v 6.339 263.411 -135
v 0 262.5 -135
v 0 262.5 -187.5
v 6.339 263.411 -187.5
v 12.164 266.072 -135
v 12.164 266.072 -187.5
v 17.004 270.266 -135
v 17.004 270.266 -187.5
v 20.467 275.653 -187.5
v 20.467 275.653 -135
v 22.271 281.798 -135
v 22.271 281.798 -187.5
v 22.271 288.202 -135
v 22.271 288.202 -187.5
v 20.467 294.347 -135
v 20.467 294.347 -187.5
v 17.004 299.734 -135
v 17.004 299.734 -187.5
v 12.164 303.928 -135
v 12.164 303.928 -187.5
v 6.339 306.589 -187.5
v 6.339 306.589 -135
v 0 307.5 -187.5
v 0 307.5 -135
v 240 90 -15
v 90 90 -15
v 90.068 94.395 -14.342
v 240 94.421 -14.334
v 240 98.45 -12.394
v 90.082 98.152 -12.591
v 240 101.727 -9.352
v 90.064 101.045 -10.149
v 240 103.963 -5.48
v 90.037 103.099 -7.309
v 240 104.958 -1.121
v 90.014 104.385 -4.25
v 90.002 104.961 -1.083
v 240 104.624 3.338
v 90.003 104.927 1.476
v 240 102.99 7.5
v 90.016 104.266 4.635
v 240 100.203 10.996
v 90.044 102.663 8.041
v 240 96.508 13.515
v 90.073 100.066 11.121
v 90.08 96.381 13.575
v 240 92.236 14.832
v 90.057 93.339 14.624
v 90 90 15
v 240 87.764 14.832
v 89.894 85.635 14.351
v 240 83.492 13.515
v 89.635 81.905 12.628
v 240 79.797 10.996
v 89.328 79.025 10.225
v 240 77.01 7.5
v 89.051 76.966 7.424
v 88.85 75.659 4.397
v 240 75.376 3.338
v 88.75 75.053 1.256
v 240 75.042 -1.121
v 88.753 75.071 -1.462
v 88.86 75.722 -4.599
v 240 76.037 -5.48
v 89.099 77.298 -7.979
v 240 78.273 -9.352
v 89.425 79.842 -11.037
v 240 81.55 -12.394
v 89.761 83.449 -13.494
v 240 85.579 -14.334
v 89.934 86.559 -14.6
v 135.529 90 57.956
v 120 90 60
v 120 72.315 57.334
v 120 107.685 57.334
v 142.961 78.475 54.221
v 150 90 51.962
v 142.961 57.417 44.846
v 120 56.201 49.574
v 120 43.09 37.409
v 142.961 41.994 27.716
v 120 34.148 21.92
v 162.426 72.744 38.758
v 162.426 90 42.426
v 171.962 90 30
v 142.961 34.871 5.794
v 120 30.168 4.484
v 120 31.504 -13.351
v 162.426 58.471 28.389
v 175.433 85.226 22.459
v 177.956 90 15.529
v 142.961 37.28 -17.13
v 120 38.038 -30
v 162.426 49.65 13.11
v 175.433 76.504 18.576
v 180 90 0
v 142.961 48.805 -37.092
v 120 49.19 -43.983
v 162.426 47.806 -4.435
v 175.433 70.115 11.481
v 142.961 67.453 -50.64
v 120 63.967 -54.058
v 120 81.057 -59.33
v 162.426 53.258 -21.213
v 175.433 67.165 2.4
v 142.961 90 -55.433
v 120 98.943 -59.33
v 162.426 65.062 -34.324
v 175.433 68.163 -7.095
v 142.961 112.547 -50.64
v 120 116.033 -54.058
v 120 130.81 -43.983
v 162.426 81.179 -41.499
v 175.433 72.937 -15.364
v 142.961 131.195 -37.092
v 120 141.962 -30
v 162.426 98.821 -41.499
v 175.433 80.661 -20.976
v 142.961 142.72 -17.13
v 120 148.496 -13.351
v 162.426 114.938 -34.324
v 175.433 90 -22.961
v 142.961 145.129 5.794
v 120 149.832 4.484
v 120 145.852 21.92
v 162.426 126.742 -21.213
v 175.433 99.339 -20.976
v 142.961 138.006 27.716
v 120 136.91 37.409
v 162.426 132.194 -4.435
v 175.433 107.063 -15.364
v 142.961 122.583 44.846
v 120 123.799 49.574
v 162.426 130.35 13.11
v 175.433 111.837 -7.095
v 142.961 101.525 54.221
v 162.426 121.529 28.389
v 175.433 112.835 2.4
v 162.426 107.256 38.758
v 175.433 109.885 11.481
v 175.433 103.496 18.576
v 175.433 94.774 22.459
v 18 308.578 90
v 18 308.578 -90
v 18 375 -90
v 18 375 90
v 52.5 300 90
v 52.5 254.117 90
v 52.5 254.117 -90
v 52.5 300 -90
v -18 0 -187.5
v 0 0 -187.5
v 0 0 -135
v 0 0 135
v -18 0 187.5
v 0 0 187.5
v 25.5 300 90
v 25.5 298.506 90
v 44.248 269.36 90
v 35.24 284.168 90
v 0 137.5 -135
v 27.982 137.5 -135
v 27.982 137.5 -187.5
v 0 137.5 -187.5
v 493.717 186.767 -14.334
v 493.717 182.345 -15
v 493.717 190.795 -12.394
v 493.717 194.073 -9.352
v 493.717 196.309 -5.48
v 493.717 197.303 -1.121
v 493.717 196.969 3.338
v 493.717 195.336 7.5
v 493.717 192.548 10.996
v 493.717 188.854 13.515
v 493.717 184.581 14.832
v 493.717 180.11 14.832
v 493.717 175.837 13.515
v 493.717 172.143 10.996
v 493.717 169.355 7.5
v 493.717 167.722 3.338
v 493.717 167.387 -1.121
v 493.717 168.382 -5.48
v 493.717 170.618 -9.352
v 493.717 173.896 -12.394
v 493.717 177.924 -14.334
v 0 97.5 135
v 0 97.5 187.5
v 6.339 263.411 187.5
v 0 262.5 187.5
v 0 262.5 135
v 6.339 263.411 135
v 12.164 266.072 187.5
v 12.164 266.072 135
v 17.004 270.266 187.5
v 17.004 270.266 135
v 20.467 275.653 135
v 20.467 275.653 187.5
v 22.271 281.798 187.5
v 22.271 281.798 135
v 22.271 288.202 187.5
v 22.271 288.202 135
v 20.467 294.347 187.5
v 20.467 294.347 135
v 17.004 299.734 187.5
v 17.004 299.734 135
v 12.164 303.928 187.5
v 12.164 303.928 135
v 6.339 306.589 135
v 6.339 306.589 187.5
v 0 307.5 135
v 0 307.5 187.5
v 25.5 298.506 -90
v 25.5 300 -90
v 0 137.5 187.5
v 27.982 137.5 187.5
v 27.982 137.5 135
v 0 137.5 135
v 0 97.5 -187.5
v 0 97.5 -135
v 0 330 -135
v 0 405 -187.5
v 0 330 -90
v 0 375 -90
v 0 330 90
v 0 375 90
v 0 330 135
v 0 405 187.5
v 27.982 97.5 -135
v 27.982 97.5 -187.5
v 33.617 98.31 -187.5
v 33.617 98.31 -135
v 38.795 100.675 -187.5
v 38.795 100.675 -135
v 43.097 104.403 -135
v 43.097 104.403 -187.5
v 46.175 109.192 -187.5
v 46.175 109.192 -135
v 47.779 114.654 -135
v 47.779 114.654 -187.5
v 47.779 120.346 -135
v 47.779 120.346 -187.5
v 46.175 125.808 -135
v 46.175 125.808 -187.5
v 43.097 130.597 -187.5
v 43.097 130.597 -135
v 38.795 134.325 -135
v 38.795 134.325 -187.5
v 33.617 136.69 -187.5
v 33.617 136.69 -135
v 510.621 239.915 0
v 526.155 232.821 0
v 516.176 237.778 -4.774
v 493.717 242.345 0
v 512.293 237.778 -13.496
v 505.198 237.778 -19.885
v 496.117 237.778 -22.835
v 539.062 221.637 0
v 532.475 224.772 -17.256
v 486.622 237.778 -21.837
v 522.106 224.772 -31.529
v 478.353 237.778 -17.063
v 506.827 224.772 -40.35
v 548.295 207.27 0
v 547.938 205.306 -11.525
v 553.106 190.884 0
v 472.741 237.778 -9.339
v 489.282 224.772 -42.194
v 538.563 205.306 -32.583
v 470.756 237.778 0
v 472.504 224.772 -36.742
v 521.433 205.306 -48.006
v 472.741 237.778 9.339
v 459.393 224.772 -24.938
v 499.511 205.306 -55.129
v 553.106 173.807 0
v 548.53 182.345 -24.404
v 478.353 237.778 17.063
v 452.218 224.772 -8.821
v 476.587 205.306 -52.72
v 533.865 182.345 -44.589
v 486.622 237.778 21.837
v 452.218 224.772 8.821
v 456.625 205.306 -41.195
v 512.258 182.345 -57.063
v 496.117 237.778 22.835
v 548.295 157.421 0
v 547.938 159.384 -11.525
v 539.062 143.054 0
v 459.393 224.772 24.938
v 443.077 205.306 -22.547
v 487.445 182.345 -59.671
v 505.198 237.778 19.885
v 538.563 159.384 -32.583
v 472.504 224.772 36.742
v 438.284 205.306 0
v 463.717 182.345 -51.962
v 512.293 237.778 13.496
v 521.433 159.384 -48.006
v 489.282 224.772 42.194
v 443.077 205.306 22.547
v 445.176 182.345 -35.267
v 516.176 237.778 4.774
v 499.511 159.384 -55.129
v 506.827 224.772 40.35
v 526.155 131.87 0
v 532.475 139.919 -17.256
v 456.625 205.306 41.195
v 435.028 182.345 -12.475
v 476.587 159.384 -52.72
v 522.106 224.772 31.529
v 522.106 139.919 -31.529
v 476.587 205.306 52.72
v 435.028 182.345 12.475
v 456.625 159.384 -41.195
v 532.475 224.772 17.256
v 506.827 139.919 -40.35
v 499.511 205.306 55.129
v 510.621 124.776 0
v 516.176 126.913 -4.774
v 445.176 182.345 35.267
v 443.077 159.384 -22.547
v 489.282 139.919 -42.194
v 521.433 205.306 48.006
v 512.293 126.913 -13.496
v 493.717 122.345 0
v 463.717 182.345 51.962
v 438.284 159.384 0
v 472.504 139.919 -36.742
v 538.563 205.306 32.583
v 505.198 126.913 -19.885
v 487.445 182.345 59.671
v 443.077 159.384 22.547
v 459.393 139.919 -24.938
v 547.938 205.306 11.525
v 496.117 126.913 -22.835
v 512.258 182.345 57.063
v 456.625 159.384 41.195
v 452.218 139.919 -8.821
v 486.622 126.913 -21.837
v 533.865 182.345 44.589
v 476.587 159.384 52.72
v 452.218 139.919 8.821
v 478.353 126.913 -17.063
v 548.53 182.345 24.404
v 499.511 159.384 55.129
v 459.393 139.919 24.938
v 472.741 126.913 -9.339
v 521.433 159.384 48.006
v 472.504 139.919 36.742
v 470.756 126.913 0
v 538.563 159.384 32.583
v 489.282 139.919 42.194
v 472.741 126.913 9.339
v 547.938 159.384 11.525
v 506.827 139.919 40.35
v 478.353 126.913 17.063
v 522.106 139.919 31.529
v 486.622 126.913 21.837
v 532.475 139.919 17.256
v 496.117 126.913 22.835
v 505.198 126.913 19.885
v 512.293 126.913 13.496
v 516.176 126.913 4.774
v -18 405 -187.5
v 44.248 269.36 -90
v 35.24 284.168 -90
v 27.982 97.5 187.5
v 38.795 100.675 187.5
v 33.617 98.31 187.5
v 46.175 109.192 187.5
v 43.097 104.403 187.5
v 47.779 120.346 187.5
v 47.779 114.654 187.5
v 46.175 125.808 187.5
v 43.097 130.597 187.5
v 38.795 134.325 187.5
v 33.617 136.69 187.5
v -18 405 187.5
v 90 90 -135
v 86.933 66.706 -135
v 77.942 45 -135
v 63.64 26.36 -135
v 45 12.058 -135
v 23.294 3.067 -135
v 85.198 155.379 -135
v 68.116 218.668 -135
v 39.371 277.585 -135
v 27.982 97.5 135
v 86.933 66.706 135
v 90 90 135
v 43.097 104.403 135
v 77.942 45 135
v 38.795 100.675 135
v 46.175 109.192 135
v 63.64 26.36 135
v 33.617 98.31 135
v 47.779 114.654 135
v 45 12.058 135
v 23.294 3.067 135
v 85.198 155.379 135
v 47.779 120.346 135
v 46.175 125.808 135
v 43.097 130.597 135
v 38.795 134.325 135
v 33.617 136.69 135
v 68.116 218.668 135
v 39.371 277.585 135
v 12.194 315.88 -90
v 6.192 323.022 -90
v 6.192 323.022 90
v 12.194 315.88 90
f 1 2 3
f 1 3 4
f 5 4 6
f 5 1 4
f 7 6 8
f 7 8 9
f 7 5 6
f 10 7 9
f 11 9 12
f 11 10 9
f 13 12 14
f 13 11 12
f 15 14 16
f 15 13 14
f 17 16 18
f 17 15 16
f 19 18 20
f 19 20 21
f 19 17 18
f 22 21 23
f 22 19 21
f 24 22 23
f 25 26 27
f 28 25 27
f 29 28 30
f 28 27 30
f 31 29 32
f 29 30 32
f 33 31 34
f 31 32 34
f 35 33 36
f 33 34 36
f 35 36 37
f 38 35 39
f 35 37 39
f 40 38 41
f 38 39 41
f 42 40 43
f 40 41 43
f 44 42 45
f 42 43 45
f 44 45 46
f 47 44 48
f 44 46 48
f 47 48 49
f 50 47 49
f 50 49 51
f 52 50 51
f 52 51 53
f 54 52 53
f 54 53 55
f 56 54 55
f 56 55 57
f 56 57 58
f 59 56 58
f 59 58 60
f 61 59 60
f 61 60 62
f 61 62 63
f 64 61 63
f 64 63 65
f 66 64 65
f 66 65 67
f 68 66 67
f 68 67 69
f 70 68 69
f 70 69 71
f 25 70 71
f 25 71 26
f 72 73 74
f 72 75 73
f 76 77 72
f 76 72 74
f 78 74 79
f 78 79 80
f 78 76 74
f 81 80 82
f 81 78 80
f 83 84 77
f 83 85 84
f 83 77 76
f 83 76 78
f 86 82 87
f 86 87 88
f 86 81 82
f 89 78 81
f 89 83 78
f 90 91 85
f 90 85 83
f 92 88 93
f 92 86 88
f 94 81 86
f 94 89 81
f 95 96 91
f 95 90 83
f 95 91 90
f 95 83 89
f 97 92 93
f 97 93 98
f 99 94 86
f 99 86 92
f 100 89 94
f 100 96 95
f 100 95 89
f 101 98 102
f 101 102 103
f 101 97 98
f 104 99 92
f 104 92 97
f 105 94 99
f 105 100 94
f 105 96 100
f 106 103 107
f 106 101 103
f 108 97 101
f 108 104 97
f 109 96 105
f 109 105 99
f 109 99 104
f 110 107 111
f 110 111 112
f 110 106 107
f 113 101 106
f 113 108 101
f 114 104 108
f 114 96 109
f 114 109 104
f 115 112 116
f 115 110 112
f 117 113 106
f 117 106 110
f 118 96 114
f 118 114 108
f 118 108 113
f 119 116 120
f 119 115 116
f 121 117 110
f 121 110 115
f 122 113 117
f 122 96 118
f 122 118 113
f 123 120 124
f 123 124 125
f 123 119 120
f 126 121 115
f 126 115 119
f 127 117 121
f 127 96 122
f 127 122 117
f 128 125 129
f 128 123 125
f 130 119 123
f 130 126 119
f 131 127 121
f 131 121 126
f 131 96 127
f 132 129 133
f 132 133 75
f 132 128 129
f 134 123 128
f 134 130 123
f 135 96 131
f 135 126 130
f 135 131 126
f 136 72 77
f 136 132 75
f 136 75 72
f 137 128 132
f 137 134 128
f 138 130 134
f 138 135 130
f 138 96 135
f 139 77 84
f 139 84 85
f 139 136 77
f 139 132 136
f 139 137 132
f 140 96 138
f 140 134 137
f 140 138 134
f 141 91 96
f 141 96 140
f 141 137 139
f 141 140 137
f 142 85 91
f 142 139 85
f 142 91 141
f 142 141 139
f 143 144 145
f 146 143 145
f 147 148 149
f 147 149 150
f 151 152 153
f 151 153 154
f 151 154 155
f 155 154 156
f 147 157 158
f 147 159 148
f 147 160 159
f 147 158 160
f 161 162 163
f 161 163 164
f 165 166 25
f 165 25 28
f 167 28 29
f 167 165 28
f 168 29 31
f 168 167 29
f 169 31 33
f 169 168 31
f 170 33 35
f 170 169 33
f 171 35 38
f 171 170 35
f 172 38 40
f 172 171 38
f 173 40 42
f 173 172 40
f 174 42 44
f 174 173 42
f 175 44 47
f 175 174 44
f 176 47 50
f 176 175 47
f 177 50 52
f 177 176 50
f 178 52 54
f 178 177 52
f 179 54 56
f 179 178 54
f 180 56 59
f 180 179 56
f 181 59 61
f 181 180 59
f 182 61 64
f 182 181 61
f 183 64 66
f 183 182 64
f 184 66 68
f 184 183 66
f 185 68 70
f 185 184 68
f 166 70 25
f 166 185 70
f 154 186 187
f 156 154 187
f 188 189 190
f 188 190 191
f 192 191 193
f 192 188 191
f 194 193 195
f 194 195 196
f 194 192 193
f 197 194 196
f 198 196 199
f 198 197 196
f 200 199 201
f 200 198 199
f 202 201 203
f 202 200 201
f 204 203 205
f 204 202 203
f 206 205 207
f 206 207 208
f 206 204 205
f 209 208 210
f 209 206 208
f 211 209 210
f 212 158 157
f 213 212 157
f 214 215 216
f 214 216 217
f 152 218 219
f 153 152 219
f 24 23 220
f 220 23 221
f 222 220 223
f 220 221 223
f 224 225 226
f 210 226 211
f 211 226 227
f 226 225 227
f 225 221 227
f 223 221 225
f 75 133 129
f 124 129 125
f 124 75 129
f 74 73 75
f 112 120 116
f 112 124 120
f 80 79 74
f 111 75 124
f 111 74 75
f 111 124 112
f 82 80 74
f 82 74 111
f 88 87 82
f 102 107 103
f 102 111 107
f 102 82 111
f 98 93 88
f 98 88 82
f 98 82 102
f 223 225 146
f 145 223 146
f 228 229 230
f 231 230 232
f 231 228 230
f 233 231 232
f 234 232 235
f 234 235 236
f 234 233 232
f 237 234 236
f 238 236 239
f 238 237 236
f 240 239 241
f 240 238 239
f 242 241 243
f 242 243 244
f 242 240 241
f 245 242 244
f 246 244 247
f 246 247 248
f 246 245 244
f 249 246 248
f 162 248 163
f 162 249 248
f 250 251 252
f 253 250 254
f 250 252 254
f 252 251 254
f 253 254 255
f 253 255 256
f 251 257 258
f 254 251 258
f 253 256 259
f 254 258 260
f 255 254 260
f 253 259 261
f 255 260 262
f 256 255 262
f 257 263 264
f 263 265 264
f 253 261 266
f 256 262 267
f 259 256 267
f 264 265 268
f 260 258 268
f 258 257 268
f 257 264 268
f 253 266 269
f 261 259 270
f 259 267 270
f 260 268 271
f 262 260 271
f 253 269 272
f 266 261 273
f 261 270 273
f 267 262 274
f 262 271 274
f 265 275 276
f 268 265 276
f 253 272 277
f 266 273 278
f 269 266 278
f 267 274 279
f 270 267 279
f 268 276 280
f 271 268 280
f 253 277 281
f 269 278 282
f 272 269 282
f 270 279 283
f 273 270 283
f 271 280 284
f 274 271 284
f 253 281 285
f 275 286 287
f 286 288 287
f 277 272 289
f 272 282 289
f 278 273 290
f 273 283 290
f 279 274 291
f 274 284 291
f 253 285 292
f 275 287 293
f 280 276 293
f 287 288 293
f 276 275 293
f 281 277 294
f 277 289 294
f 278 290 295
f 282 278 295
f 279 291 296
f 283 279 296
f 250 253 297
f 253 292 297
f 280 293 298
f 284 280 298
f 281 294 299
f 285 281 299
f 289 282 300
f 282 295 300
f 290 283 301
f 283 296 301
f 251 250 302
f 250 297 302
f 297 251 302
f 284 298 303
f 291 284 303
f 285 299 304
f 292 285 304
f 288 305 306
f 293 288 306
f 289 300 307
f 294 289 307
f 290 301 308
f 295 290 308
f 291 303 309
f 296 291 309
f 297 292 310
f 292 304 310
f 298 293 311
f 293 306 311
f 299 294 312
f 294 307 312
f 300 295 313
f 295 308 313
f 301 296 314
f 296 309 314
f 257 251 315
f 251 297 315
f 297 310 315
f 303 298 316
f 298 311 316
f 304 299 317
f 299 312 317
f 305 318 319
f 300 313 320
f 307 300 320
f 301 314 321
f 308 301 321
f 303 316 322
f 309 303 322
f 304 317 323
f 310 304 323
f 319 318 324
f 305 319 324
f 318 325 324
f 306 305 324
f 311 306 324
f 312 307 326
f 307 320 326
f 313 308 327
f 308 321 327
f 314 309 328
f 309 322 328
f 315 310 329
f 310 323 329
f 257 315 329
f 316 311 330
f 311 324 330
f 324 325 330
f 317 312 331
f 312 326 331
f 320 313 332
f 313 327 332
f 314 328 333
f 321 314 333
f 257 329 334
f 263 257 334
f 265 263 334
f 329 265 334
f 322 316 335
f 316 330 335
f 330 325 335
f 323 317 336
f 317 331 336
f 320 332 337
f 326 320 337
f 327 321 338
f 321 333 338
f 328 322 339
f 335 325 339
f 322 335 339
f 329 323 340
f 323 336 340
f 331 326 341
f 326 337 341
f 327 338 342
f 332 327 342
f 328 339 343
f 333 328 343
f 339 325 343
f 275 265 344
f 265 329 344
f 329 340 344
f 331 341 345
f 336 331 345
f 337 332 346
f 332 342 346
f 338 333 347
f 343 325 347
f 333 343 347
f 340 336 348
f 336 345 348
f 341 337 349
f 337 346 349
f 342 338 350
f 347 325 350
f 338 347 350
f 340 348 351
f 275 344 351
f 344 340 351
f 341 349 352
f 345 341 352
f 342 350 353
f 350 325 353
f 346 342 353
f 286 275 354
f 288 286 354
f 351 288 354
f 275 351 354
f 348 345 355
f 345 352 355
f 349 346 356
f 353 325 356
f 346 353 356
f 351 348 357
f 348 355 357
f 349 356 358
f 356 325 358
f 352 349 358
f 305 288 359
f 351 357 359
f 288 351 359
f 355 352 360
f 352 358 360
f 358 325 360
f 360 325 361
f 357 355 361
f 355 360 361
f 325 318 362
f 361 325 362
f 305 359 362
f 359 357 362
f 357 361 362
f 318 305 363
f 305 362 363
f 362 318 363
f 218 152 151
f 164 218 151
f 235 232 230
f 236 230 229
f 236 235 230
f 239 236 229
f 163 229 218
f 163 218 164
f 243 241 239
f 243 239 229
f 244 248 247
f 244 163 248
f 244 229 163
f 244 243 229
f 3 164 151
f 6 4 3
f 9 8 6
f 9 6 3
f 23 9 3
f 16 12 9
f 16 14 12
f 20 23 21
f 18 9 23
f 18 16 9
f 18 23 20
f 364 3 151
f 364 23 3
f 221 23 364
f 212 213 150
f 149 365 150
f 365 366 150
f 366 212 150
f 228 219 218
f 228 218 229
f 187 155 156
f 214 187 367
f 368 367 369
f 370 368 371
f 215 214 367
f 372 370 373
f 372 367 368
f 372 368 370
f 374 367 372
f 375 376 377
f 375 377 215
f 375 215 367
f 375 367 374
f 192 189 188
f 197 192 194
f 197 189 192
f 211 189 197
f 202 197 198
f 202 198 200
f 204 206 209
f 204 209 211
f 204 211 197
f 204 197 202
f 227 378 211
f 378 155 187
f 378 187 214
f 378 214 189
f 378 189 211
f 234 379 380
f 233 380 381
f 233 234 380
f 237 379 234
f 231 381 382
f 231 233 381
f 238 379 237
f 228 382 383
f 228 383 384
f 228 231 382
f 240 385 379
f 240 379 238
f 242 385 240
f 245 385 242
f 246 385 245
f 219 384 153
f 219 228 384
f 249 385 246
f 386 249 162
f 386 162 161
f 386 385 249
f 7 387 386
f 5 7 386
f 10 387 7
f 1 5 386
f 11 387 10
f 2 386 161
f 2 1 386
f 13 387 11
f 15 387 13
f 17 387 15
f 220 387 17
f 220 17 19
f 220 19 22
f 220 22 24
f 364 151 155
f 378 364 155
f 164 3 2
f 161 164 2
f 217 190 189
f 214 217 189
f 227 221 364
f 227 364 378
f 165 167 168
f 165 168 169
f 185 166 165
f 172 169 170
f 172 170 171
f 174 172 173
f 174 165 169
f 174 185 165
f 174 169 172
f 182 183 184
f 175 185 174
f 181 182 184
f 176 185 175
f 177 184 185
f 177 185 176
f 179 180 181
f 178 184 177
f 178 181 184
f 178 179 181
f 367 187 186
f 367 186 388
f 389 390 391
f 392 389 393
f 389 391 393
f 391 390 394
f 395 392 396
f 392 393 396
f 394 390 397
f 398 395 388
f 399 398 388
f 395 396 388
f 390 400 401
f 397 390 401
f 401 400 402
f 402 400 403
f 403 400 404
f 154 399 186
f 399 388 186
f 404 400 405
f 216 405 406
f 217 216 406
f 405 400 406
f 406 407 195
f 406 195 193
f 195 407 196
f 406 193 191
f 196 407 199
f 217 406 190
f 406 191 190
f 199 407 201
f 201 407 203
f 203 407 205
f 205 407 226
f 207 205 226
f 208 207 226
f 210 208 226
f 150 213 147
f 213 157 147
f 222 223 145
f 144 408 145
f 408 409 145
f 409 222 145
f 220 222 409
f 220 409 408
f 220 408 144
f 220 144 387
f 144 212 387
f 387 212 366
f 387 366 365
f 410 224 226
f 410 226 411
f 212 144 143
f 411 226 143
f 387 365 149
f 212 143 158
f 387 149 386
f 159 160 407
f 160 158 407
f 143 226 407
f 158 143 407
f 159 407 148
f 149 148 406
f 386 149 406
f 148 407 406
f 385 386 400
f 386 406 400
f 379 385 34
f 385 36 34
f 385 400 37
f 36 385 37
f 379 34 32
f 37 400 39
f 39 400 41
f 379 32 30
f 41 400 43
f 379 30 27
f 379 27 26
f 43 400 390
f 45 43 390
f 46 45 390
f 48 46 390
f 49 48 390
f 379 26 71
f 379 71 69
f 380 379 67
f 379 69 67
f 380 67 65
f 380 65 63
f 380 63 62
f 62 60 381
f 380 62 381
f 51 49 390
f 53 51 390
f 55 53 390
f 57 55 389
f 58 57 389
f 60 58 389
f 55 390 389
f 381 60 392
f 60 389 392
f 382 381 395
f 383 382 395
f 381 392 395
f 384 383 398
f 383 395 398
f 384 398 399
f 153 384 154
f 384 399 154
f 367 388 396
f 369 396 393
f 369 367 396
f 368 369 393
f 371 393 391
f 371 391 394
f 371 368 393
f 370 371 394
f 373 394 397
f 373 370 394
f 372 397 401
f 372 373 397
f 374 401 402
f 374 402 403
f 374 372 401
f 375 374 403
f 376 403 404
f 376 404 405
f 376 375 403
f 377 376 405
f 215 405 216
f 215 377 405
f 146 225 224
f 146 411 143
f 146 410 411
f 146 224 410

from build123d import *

# Parameters (mm, degrees)
BOSS_EXTRUDE1_DEPTH = 135
SKETCH2_W           = 375
SKETCH2_H           = 405
BOSS_EXTRUDE2_DEPTH = 18
SKETCH3_W           = 18
SKETCH3_H           = 105.613020489
SKETCH3_W_2         = 27
SKETCH3_H_2         = 130.138797092
BOSS_EXTRUDE3_DEPTH = 90
BOSS_EXTRUDE4_REACH = 561.254
SKETCH5_R           = 15
BOSS_EXTRUDE5_DEPTH = 240
SKETCH8_R           = 15


with BuildPart() as part:
    # Sketch1 → Boss-Extrude1 (new, symmetric)
    with BuildSketch(Plane.XY):
        with BuildLine():
            Line((0, 0), (0, 330))
            ThreePointArc((0, 330), (68.115769304, 218.668413489), (90, 90))
            ThreePointArc((90, 90), (63.639610307, 26.360389693), (0, 0))
        make_face()
    extrude(amount=BOSS_EXTRUDE1_DEPTH, both=True)

    # Sketch2 → Boss-Extrude2 (add)
    with BuildSketch(Plane.ZY):
        with Locations((0, 202.5)):
            Rectangle(SKETCH2_W, SKETCH2_H)
    extrude(amount=BOSS_EXTRUDE2_DEPTH)

    # Sketch3 → Boss-Extrude3 (add, symmetric)
    with BuildSketch(Plane.XY):
        with Locations((9, 322.193489755)):
            Rectangle(SKETCH3_W, SKETCH3_H)
        with Locations((39, 234.930601454)):
            Rectangle(SKETCH3_W_2, SKETCH3_H_2)
    extrude(amount=BOSS_EXTRUDE3_DEPTH, both=True)

    # Boss-Extrude4: up to this face of the body (flat: up to its plane)
    boss_extrude4_end = Plane(part.part.faces().sort_by_distance((-9, 202.5, -187.5))[0])
    # Sketch4 → Boss-Extrude4 (add, up to the picked face)
    with BuildSketch(Plane.XY.offset(187.5), mode=Mode.PRIVATE) as boss_extrude4_sk1:
        with BuildLine():
            Line((0, 97.5), (27.982340315, 97.5))
            ThreePointArc((27.982340315, 97.5), (47.982340315, 117.5), (27.982340315, 137.5))
            Line((27.982340315, 137.5), (0, 137.5))
            Line((0, 137.5), (0, 97.5))
        make_face()
    boss_extrude4_tool1 = split(extrude(boss_extrude4_sk1.sketch, amount=-BOSS_EXTRUDE4_REACH, mode=Mode.PRIVATE), bisect_by=boss_extrude4_end, keep=Keep.BOTH, mode=Mode.PRIVATE)
    # Sketch4 → Boss-Extrude4 (add, up to the picked face)
    with BuildSketch(Plane.XY.offset(187.5), mode=Mode.PRIVATE) as boss_extrude4_sk2:
        with BuildLine():
            Line((0, 307.5), (0, 262.5))
            ThreePointArc((0, 262.5), (22.5, 285), (0, 307.5))
        make_face()
    boss_extrude4_tool2 = split(extrude(boss_extrude4_sk2.sketch, amount=-BOSS_EXTRUDE4_REACH, mode=Mode.PRIVATE), bisect_by=boss_extrude4_end, keep=Keep.BOTH, mode=Mode.PRIVATE)
    add(boss_extrude4_tool1.solids().sort_by(Axis((22.073195, 117.5, 187.5), (0, 0, -1)))[0])
    add(boss_extrude4_tool2.solids().sort_by(Axis((9.549297, 285, 187.5), (0, 0, -1)))[0])

    # Sketch5 → Boss-Extrude5 (add)
    with BuildSketch(Plane(origin=(0, 0, 0), x_dir=(0, 0, -1), z_dir=(1, 0, 0))):
        with Locations((0, 90)):
            Circle(SKETCH5_R)
    extrude(amount=BOSS_EXTRUDE5_DEPTH)

    # Sweep1: sweep along a path in Sketch7
    with BuildLine(Plane.XY) as sweep1_path:
        Line((240, 90), (493.717007612, 182.345438698))
    # Sketch8 → Sweep1 (sweep)
    with BuildSketch(Plane(origin=(240, 0, 0), x_dir=(0, 0, -1), z_dir=(1, 0, 0))):
        with Locations((0, 90)):
            Circle(SKETCH8_R)
    sweep(path=sweep1_path.line)


with BuildPart() as body_2:
    # Sketch6 → Revolve1 (revolve)
    with BuildSketch(Plane(origin=(0, 90, 0), x_dir=(-1, 0, 0), z_dir=(0, -1, 0))):
        with BuildLine():
            Line((-120, 0), (-120, -60))
            ThreePointArc((-120, -60), (-162.426406871, -42.426406871), (-180, 0))
            Line((-180, 0), (-120, 0))
        make_face()
    revolve(axis=Axis((120, 90, 0), (1, 0, 0)))


with BuildPart() as body_3:
    # Sketch9 → Revolve2 (revolve)
    with BuildSketch(Plane.XY):
        with BuildLine():
            Line((493.717007612, 122.345438698), (493.717007612, 242.345438698))
            ThreePointArc((493.717007612, 242.345438698), (553.717007612, 182.345438698), (493.717007612, 122.345438698))
        make_face()
    revolve(axis=Axis((493.717007612, 122.345438698, 0), (0, 1, 0)))


solid = Compound([part.part, body_2.part, body_3.part])
